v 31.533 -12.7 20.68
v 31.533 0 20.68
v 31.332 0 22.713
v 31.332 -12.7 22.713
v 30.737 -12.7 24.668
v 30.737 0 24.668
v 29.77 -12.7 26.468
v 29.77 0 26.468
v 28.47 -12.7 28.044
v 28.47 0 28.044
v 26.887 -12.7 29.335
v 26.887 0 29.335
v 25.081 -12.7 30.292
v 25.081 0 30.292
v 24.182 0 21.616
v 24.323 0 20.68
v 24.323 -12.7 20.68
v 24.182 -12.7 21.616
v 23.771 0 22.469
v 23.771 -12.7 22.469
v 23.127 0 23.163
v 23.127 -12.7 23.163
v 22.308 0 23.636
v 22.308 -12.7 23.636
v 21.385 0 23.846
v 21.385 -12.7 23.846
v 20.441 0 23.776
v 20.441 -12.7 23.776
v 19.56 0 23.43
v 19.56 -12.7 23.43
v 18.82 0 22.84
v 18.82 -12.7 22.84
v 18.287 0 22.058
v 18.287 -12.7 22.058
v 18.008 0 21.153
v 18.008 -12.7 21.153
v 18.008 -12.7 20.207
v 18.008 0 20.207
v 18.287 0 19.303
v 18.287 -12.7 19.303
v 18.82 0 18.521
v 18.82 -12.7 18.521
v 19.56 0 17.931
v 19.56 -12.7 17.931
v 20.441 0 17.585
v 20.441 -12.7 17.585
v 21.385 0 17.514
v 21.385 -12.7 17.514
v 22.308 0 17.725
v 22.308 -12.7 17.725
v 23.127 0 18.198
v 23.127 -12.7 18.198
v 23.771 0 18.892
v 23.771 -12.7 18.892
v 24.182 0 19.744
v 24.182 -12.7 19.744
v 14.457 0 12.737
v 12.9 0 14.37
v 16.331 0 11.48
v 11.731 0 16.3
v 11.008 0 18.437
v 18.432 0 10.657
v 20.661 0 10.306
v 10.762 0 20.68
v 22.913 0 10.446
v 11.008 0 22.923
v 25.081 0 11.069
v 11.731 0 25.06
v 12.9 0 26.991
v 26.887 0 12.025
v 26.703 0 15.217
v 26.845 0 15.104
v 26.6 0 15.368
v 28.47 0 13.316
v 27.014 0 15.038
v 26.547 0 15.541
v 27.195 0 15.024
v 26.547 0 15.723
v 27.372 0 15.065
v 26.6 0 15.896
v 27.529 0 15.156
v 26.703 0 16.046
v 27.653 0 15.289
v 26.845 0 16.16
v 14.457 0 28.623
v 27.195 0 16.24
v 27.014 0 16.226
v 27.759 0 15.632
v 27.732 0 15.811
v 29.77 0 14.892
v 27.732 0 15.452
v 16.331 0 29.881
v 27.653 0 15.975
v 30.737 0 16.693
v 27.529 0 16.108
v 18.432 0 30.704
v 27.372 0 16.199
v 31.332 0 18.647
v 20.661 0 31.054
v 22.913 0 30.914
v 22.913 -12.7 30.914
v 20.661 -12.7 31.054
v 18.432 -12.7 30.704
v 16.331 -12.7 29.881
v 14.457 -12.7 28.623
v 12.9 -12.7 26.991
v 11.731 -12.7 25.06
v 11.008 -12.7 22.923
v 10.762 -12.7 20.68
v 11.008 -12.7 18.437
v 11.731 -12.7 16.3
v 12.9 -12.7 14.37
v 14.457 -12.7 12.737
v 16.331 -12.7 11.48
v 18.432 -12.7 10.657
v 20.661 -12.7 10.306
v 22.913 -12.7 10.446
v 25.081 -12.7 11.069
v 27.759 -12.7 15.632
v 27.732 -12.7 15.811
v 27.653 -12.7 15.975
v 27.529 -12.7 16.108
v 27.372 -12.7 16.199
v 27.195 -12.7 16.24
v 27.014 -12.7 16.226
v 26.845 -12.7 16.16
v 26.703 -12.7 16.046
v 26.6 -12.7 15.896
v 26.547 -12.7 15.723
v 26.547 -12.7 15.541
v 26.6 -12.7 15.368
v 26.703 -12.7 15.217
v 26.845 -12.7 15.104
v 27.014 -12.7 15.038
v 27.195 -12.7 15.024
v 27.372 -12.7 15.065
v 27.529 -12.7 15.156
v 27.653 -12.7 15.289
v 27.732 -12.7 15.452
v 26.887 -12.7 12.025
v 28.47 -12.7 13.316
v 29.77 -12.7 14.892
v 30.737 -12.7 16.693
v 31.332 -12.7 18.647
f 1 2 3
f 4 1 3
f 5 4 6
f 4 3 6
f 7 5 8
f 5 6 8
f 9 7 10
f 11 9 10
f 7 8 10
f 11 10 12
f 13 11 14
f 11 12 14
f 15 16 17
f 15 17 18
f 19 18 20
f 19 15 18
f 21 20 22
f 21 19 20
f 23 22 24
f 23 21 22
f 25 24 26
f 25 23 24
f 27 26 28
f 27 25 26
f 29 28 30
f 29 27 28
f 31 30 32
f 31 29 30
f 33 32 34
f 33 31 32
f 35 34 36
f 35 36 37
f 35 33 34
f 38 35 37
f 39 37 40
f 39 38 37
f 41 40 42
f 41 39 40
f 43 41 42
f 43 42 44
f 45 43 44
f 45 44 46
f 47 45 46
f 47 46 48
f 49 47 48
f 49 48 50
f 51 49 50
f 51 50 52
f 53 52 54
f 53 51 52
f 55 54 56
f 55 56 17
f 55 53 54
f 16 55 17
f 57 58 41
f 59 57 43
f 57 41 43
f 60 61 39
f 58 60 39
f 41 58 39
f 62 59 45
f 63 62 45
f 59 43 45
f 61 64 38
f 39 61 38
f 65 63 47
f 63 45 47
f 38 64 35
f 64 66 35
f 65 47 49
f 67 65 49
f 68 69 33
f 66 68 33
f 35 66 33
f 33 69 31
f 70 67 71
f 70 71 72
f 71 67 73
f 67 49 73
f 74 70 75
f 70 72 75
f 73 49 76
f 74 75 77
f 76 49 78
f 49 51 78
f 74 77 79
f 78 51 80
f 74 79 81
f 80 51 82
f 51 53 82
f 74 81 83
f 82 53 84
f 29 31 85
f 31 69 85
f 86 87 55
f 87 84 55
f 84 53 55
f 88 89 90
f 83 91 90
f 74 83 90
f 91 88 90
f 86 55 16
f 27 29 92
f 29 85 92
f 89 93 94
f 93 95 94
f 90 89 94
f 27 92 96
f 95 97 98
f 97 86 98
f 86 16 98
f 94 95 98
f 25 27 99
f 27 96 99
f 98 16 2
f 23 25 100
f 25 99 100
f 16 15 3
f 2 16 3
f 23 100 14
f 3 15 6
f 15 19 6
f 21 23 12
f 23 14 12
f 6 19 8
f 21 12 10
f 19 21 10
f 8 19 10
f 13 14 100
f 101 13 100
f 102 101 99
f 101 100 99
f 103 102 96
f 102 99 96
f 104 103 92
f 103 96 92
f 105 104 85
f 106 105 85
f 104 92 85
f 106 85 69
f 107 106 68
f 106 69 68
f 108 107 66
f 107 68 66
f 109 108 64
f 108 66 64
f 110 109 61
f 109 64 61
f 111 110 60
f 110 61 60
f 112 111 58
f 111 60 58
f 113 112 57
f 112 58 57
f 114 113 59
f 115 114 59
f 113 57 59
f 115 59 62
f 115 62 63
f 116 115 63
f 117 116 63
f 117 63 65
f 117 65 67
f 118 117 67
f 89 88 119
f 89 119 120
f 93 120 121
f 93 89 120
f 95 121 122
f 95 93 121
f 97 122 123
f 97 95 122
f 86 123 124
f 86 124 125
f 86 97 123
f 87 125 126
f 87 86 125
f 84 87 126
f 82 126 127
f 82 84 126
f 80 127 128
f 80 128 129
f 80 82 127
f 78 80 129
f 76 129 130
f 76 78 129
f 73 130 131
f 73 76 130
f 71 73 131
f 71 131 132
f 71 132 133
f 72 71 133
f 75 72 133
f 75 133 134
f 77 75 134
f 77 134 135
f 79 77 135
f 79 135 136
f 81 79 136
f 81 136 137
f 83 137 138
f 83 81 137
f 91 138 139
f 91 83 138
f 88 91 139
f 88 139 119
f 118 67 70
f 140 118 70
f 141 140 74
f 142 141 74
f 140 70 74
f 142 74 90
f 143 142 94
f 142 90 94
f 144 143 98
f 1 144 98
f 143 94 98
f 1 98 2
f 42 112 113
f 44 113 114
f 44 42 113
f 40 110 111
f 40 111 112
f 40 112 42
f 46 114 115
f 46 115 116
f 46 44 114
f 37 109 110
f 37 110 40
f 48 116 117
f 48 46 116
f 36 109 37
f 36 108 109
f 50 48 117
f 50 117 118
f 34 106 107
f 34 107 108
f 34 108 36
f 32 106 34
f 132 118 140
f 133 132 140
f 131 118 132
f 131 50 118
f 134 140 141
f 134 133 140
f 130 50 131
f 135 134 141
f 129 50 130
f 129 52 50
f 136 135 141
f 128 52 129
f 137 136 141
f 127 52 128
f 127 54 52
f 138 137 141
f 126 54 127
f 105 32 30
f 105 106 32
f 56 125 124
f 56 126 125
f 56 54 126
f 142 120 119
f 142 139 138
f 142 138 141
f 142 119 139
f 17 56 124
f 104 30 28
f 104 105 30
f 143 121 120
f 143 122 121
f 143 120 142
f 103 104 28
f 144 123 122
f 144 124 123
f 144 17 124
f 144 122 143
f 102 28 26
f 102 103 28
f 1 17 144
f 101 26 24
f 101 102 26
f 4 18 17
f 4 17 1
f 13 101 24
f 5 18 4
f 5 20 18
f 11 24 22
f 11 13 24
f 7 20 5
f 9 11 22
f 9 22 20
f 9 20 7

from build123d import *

# Parameters (mm, degrees)
F0_R     = 0.6093226382
F0_R_2   = 3.175
F1_DEPTH = 12.7


with BuildPart() as f1:
    # F0 (on Front) → F1 (new body)
    with BuildSketch(Plane.XZ):
        with BuildLine():
            ThreePointArc((31.5328345598, 20.6802571494), (29.770402539, 26.4681944004), (25.0812980369, 30.2916330645))
            Line((25.0812980369, 30.2916330645), (25.0812980369, 11.0688812343))
            ThreePointArc((25.0812980369, 11.0688812343), (29.770402539, 14.8923198983), (31.5328345598, 20.6802571494))
        make_face()
        with Locations((27.1492786705, 15.6318955123)):
            Circle(F0_R, mode=Mode.SUBTRACT)
        with BuildLine():
            Line((25.0812980369, 11.0688812343), (25.0812980369, 30.2916330645))
            ThreePointArc((25.0812980369, 30.2916330645), (10.7624537347, 20.6802571494), (25.0812980369, 11.0688812343))
        make_face()
        with Locations((21.1476441473, 20.6802571494)):
            Circle(F0_R_2, mode=Mode.SUBTRACT)
    extrude(amount=F1_DEPTH)


solid = f1.part
